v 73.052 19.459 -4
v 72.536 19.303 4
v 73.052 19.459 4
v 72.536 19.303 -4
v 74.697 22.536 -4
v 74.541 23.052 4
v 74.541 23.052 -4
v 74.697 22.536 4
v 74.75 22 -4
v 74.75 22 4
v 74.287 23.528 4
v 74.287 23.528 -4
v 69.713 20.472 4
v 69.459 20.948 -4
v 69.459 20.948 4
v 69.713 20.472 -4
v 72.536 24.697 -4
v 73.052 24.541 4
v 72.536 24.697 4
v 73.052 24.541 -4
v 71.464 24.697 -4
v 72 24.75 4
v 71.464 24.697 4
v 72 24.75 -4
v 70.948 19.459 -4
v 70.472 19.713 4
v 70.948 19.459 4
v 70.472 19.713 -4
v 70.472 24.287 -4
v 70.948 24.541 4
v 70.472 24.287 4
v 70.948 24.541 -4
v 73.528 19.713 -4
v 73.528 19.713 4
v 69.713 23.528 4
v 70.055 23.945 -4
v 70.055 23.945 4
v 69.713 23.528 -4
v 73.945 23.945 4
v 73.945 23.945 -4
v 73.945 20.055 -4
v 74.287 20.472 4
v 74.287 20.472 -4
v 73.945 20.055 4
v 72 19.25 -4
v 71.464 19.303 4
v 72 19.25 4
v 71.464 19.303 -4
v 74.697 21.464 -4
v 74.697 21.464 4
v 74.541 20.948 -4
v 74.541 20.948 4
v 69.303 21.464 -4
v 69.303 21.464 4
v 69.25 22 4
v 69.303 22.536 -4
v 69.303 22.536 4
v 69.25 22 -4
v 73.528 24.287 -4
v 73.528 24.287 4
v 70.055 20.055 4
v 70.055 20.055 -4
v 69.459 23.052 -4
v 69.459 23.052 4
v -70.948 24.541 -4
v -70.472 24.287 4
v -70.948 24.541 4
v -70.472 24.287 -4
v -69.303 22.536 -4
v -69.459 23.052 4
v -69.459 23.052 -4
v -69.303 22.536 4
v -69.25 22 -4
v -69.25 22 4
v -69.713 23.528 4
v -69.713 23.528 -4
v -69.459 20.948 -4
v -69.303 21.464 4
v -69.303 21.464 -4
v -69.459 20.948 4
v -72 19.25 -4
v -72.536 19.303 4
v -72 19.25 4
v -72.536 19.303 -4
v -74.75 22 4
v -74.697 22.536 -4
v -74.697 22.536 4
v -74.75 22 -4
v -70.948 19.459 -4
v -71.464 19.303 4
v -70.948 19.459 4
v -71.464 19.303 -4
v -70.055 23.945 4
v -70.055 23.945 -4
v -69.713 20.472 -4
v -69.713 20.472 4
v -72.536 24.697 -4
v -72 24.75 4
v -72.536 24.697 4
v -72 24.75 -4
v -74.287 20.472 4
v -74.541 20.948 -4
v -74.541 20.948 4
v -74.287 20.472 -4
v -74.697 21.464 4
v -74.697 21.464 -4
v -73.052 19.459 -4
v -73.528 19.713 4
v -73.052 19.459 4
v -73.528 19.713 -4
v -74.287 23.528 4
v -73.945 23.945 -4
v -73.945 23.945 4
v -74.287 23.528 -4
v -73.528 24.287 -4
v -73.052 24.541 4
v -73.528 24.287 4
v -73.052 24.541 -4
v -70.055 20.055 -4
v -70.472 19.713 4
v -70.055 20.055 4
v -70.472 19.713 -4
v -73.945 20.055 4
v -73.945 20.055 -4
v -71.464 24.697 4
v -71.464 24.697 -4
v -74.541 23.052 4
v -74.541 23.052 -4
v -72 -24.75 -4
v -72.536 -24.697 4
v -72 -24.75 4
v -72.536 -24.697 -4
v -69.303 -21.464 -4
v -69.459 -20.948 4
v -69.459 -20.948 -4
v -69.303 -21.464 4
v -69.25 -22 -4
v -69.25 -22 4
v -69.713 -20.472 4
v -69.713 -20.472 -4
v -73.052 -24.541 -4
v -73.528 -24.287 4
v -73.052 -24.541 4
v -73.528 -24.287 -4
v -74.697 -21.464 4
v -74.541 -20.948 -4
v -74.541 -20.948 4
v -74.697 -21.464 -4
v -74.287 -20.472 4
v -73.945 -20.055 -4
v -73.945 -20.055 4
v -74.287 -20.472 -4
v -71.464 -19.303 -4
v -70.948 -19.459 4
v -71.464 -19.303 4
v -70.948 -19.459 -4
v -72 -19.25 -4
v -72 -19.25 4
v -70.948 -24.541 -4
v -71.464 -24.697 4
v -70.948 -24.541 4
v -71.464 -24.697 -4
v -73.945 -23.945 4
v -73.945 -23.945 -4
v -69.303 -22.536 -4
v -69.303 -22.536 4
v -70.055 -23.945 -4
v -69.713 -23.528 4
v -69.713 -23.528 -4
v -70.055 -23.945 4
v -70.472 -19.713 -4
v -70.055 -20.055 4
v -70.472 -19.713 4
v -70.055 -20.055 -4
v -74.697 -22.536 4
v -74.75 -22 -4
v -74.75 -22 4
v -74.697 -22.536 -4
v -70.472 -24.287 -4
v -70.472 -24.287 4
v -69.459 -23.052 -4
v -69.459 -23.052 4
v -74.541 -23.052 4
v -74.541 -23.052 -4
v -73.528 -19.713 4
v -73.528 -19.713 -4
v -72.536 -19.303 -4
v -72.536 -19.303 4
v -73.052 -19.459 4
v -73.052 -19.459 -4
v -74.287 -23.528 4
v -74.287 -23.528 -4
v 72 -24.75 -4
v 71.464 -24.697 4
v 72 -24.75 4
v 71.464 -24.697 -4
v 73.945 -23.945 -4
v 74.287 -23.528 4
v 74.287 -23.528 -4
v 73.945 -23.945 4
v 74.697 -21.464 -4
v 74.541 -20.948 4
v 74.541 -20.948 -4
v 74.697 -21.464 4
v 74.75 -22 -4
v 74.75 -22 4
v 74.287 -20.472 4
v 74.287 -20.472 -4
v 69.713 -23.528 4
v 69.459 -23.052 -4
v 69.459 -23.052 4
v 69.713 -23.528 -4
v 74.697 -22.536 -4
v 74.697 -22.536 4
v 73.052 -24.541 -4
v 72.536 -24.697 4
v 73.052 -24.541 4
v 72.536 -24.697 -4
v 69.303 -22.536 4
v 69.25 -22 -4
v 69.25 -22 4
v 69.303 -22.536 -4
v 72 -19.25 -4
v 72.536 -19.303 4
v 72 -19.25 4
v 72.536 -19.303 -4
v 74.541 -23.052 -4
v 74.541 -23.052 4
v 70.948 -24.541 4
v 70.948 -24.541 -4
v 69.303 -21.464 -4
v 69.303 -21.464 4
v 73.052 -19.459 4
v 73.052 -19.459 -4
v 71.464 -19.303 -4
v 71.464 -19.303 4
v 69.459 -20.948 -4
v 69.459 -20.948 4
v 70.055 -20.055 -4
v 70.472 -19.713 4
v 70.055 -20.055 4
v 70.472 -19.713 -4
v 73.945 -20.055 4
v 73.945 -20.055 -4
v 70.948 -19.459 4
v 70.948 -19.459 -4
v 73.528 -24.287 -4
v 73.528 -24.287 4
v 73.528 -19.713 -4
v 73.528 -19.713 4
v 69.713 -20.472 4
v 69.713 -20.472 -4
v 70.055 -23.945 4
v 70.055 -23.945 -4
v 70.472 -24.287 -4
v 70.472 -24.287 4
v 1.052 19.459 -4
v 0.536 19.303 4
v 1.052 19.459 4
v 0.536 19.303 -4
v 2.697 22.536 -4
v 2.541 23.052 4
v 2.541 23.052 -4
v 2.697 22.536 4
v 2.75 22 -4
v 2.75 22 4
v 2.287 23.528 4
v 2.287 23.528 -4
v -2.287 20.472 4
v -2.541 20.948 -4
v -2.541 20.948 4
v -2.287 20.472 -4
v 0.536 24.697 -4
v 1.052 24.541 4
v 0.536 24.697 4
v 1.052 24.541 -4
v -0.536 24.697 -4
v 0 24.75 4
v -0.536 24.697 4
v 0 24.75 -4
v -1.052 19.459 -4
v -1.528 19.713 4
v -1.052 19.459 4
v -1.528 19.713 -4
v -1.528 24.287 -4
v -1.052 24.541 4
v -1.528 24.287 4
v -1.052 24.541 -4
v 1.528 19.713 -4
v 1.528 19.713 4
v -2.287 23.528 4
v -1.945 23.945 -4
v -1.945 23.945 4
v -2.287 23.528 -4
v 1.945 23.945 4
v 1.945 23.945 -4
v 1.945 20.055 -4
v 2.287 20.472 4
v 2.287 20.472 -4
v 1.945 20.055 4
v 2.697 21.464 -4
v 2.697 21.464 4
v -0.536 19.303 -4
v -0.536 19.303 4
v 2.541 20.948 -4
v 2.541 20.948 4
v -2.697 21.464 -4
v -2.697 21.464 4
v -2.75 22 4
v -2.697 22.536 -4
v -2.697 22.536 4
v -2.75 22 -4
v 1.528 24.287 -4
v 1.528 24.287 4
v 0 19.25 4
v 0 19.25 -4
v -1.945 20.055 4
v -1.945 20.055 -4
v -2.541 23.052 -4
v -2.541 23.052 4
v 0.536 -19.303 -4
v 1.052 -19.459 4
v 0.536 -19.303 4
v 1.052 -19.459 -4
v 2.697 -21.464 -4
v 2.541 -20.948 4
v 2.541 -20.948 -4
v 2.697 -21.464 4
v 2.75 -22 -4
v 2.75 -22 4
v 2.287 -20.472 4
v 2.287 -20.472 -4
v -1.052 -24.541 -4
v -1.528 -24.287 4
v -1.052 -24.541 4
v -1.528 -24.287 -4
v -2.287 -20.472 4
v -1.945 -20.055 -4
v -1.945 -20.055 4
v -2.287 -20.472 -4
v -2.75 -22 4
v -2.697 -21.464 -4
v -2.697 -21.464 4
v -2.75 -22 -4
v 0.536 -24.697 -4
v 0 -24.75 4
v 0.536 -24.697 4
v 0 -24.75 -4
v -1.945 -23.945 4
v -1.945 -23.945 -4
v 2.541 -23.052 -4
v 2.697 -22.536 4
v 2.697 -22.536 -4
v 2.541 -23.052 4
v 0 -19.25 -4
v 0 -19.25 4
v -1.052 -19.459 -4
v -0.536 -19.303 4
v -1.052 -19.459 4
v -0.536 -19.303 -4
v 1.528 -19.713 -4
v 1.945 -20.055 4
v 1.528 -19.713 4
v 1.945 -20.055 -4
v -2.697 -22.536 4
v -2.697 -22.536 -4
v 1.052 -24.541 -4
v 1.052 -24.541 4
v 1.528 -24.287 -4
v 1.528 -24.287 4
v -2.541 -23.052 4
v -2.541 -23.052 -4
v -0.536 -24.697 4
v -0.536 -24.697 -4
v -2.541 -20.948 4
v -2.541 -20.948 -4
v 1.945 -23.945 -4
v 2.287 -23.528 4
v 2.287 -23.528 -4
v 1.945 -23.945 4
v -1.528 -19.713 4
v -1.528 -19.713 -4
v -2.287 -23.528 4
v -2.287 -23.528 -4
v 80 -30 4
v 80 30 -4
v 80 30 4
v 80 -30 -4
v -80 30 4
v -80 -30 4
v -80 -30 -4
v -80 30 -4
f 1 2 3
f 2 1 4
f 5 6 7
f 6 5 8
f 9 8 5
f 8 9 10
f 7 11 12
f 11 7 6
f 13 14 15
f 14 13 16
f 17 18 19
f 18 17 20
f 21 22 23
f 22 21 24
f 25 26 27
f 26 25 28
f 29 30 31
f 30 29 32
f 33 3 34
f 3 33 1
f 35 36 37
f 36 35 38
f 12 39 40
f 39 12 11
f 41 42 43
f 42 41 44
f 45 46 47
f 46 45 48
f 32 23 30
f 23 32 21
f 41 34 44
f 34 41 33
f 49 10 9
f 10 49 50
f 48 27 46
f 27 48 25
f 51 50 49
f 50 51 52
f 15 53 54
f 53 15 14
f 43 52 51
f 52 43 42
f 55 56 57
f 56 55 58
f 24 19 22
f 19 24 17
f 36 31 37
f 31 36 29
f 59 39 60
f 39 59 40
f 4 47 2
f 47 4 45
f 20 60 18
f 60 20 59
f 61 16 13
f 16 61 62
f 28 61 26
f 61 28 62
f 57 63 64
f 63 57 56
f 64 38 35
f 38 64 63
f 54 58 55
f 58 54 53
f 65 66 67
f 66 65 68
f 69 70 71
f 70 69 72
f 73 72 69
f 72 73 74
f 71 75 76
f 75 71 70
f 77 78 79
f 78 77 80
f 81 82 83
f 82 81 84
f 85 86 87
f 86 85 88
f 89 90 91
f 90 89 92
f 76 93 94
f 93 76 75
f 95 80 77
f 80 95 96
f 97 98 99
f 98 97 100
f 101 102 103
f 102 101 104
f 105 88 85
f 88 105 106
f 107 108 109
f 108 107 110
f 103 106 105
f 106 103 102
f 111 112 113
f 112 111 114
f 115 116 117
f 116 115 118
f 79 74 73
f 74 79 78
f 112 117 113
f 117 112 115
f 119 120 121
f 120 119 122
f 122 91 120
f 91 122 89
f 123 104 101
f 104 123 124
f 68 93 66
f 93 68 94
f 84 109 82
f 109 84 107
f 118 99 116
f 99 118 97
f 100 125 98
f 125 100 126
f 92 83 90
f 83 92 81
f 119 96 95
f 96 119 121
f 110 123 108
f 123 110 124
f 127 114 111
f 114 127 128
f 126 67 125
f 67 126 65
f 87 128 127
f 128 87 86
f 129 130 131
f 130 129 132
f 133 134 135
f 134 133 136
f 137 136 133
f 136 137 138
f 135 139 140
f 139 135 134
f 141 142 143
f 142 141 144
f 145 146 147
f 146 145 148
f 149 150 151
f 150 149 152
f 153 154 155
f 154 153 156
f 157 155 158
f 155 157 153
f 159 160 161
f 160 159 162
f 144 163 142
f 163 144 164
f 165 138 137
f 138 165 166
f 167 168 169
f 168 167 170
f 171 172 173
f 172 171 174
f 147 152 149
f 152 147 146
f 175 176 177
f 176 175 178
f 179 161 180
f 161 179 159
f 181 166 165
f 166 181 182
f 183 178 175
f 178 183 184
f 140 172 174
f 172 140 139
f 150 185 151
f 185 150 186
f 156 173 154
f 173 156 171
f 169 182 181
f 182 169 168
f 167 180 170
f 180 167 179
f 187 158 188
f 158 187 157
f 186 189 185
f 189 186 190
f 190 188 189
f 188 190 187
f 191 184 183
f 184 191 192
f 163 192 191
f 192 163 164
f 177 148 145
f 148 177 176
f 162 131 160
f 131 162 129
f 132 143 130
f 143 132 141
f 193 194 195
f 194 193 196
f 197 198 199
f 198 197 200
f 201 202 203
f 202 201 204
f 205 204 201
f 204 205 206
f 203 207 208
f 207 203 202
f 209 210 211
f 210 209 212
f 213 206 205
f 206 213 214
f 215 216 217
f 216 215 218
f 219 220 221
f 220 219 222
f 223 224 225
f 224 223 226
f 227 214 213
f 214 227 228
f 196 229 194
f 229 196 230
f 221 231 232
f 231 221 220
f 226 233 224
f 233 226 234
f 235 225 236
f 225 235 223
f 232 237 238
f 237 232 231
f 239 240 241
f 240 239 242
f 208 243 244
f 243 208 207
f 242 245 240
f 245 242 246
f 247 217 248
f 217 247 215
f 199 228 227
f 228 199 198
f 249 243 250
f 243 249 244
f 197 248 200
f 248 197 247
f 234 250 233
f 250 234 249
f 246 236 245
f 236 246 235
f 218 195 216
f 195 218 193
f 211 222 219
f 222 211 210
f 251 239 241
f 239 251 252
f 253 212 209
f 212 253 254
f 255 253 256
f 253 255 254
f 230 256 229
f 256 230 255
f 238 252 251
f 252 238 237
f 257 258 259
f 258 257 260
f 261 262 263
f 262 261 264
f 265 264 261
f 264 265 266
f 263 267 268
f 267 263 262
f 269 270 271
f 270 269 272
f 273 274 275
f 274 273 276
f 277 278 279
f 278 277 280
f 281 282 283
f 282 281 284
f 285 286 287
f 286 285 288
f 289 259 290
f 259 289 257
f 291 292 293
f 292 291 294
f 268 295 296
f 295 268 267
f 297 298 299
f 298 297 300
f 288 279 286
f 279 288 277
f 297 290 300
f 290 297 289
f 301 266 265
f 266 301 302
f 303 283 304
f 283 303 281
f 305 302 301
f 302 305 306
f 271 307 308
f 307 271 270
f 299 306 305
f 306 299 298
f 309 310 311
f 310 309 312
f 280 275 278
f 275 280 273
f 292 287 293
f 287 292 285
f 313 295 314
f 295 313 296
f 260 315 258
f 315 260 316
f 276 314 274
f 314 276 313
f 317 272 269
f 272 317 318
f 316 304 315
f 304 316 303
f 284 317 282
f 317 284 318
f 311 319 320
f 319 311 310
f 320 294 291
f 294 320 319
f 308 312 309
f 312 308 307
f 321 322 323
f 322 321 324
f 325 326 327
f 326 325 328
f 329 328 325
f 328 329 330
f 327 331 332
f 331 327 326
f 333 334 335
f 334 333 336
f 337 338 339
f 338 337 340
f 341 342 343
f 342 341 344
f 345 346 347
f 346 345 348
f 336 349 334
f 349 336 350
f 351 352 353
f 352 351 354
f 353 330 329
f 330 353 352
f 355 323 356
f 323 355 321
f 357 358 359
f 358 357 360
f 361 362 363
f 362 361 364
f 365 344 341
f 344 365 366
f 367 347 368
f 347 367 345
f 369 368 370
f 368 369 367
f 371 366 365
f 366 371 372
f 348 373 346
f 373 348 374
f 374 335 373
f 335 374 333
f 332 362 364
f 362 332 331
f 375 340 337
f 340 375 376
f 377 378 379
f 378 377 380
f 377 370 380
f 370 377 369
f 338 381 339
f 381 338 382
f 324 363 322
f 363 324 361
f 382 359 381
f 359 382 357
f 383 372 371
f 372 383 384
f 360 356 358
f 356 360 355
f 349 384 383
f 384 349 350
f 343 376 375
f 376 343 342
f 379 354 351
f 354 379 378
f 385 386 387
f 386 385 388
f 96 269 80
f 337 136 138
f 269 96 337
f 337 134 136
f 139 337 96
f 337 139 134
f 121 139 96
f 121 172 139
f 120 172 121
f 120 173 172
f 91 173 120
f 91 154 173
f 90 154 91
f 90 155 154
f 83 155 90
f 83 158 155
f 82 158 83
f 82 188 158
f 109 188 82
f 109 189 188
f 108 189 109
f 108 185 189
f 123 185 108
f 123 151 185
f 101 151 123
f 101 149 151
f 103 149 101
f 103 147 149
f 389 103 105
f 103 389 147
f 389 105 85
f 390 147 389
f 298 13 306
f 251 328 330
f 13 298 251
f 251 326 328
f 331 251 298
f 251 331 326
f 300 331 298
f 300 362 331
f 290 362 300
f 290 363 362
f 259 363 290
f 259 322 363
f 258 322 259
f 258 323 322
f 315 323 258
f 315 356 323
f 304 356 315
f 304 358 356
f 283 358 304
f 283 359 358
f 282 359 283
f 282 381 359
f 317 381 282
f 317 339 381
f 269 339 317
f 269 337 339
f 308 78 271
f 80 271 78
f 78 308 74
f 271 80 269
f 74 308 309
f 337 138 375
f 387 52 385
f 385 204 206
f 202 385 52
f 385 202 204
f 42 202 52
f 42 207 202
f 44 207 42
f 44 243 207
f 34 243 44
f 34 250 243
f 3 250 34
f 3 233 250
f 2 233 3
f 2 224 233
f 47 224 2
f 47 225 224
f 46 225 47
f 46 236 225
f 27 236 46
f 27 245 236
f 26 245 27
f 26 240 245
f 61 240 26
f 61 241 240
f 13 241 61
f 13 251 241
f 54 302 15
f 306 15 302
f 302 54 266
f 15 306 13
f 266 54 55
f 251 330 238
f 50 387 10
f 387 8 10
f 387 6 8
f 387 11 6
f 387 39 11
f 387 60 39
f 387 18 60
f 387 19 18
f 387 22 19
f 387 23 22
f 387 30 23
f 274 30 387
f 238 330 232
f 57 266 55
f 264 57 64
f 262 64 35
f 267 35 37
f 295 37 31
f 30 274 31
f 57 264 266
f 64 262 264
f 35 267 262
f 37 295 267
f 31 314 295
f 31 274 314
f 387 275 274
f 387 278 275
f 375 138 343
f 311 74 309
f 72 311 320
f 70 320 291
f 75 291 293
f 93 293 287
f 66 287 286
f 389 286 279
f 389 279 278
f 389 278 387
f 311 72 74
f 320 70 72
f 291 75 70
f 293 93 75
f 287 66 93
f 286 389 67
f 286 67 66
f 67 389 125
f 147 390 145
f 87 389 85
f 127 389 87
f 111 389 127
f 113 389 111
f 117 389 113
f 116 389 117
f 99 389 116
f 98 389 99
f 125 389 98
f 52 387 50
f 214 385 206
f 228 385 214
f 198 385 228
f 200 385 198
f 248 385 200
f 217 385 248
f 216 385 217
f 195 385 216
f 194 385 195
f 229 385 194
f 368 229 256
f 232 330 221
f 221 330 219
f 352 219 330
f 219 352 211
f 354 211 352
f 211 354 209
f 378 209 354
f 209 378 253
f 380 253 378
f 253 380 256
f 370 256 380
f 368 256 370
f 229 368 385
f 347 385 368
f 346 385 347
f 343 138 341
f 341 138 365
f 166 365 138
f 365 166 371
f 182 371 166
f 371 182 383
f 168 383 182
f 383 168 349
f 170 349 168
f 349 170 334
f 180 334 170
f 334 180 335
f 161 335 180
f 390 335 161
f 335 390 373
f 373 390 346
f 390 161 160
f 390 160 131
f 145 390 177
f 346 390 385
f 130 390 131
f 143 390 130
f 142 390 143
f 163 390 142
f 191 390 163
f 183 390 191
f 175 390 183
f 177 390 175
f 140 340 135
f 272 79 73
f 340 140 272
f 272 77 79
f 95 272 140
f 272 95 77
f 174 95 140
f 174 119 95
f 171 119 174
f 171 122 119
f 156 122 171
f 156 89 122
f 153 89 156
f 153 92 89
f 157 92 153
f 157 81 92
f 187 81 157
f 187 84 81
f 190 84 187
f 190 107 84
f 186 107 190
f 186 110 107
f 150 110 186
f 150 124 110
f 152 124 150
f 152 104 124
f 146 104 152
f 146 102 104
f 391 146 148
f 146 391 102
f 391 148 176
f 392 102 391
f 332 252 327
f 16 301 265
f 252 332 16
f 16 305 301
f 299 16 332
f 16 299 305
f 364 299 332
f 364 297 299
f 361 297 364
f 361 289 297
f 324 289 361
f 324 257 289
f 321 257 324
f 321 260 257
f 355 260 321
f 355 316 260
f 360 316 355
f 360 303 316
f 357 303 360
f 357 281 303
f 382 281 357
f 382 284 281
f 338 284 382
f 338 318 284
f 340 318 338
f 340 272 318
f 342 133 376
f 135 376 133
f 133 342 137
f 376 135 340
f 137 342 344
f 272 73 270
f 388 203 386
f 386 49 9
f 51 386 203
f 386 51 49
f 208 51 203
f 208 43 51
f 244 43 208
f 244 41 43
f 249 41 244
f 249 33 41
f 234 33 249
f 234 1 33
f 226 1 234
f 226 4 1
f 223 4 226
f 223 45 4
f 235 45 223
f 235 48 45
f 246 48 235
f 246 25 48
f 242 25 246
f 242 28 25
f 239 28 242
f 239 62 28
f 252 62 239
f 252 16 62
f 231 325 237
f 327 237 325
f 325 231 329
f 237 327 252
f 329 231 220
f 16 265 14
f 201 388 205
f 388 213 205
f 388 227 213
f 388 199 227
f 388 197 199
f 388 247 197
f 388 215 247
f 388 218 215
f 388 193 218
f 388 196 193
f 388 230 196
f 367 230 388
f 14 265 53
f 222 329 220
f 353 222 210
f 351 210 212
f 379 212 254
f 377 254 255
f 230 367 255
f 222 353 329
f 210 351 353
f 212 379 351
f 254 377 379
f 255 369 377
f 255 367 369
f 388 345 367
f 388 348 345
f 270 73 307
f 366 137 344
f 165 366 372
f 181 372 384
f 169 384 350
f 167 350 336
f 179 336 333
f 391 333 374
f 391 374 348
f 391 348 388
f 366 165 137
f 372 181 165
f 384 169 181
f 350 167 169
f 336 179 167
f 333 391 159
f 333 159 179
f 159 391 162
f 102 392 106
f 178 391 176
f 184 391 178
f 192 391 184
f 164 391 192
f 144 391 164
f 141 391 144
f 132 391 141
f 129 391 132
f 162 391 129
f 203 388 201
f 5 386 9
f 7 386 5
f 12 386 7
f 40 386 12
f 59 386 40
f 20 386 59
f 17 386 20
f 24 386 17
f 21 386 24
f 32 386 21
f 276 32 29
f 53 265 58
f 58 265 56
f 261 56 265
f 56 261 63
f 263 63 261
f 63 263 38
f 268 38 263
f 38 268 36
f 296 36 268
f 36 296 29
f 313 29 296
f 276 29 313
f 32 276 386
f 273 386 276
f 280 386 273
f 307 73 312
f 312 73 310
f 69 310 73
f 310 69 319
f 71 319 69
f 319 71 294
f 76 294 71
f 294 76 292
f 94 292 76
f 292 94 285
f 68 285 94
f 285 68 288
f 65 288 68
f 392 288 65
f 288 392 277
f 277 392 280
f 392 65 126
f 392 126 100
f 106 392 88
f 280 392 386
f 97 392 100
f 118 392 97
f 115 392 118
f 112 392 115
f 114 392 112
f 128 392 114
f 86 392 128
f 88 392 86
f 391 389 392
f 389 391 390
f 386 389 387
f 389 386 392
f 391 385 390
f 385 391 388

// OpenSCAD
$fn = 32;

// ----------------------------------------------------------------------
// Corner plate 160 x 60 x 8
// 6 holes, centres taken from the edge offset
// ----------------------------------------------------------------------

// --- parameters (mm) ---
plate = [160, 60, 8];  // overall size (x, y, z)
holes = 6;             // number of holes the drawing asks for
hole_d = 5.5;          // hole diameter
edge = 8;              // hole centre offset from the plate edge

// --- derived feature positions (mm) ---
corner_x = plate[0] / 2 - edge;  // = 72   corner hole X
corner_y = plate[1] / 2 - edge;  // = 22   corner hole Y
feature_centers = [
  [corner_x, corner_y],
  [-corner_x, corner_y],
  [-corner_x, -corner_y],
  [corner_x, -corner_y],
  [0, corner_y],
  [0, -corner_y]
];   // hole centres the loop below drills

// plate outline, every hole drilled through with the same cutters
difference() {
  cube(plate, center = true);
  for (centre = feature_centers)
    translate([centre[0], centre[1], 0])
      cylinder(d = hole_d, h = plate[2] + 2, center = true);
}
